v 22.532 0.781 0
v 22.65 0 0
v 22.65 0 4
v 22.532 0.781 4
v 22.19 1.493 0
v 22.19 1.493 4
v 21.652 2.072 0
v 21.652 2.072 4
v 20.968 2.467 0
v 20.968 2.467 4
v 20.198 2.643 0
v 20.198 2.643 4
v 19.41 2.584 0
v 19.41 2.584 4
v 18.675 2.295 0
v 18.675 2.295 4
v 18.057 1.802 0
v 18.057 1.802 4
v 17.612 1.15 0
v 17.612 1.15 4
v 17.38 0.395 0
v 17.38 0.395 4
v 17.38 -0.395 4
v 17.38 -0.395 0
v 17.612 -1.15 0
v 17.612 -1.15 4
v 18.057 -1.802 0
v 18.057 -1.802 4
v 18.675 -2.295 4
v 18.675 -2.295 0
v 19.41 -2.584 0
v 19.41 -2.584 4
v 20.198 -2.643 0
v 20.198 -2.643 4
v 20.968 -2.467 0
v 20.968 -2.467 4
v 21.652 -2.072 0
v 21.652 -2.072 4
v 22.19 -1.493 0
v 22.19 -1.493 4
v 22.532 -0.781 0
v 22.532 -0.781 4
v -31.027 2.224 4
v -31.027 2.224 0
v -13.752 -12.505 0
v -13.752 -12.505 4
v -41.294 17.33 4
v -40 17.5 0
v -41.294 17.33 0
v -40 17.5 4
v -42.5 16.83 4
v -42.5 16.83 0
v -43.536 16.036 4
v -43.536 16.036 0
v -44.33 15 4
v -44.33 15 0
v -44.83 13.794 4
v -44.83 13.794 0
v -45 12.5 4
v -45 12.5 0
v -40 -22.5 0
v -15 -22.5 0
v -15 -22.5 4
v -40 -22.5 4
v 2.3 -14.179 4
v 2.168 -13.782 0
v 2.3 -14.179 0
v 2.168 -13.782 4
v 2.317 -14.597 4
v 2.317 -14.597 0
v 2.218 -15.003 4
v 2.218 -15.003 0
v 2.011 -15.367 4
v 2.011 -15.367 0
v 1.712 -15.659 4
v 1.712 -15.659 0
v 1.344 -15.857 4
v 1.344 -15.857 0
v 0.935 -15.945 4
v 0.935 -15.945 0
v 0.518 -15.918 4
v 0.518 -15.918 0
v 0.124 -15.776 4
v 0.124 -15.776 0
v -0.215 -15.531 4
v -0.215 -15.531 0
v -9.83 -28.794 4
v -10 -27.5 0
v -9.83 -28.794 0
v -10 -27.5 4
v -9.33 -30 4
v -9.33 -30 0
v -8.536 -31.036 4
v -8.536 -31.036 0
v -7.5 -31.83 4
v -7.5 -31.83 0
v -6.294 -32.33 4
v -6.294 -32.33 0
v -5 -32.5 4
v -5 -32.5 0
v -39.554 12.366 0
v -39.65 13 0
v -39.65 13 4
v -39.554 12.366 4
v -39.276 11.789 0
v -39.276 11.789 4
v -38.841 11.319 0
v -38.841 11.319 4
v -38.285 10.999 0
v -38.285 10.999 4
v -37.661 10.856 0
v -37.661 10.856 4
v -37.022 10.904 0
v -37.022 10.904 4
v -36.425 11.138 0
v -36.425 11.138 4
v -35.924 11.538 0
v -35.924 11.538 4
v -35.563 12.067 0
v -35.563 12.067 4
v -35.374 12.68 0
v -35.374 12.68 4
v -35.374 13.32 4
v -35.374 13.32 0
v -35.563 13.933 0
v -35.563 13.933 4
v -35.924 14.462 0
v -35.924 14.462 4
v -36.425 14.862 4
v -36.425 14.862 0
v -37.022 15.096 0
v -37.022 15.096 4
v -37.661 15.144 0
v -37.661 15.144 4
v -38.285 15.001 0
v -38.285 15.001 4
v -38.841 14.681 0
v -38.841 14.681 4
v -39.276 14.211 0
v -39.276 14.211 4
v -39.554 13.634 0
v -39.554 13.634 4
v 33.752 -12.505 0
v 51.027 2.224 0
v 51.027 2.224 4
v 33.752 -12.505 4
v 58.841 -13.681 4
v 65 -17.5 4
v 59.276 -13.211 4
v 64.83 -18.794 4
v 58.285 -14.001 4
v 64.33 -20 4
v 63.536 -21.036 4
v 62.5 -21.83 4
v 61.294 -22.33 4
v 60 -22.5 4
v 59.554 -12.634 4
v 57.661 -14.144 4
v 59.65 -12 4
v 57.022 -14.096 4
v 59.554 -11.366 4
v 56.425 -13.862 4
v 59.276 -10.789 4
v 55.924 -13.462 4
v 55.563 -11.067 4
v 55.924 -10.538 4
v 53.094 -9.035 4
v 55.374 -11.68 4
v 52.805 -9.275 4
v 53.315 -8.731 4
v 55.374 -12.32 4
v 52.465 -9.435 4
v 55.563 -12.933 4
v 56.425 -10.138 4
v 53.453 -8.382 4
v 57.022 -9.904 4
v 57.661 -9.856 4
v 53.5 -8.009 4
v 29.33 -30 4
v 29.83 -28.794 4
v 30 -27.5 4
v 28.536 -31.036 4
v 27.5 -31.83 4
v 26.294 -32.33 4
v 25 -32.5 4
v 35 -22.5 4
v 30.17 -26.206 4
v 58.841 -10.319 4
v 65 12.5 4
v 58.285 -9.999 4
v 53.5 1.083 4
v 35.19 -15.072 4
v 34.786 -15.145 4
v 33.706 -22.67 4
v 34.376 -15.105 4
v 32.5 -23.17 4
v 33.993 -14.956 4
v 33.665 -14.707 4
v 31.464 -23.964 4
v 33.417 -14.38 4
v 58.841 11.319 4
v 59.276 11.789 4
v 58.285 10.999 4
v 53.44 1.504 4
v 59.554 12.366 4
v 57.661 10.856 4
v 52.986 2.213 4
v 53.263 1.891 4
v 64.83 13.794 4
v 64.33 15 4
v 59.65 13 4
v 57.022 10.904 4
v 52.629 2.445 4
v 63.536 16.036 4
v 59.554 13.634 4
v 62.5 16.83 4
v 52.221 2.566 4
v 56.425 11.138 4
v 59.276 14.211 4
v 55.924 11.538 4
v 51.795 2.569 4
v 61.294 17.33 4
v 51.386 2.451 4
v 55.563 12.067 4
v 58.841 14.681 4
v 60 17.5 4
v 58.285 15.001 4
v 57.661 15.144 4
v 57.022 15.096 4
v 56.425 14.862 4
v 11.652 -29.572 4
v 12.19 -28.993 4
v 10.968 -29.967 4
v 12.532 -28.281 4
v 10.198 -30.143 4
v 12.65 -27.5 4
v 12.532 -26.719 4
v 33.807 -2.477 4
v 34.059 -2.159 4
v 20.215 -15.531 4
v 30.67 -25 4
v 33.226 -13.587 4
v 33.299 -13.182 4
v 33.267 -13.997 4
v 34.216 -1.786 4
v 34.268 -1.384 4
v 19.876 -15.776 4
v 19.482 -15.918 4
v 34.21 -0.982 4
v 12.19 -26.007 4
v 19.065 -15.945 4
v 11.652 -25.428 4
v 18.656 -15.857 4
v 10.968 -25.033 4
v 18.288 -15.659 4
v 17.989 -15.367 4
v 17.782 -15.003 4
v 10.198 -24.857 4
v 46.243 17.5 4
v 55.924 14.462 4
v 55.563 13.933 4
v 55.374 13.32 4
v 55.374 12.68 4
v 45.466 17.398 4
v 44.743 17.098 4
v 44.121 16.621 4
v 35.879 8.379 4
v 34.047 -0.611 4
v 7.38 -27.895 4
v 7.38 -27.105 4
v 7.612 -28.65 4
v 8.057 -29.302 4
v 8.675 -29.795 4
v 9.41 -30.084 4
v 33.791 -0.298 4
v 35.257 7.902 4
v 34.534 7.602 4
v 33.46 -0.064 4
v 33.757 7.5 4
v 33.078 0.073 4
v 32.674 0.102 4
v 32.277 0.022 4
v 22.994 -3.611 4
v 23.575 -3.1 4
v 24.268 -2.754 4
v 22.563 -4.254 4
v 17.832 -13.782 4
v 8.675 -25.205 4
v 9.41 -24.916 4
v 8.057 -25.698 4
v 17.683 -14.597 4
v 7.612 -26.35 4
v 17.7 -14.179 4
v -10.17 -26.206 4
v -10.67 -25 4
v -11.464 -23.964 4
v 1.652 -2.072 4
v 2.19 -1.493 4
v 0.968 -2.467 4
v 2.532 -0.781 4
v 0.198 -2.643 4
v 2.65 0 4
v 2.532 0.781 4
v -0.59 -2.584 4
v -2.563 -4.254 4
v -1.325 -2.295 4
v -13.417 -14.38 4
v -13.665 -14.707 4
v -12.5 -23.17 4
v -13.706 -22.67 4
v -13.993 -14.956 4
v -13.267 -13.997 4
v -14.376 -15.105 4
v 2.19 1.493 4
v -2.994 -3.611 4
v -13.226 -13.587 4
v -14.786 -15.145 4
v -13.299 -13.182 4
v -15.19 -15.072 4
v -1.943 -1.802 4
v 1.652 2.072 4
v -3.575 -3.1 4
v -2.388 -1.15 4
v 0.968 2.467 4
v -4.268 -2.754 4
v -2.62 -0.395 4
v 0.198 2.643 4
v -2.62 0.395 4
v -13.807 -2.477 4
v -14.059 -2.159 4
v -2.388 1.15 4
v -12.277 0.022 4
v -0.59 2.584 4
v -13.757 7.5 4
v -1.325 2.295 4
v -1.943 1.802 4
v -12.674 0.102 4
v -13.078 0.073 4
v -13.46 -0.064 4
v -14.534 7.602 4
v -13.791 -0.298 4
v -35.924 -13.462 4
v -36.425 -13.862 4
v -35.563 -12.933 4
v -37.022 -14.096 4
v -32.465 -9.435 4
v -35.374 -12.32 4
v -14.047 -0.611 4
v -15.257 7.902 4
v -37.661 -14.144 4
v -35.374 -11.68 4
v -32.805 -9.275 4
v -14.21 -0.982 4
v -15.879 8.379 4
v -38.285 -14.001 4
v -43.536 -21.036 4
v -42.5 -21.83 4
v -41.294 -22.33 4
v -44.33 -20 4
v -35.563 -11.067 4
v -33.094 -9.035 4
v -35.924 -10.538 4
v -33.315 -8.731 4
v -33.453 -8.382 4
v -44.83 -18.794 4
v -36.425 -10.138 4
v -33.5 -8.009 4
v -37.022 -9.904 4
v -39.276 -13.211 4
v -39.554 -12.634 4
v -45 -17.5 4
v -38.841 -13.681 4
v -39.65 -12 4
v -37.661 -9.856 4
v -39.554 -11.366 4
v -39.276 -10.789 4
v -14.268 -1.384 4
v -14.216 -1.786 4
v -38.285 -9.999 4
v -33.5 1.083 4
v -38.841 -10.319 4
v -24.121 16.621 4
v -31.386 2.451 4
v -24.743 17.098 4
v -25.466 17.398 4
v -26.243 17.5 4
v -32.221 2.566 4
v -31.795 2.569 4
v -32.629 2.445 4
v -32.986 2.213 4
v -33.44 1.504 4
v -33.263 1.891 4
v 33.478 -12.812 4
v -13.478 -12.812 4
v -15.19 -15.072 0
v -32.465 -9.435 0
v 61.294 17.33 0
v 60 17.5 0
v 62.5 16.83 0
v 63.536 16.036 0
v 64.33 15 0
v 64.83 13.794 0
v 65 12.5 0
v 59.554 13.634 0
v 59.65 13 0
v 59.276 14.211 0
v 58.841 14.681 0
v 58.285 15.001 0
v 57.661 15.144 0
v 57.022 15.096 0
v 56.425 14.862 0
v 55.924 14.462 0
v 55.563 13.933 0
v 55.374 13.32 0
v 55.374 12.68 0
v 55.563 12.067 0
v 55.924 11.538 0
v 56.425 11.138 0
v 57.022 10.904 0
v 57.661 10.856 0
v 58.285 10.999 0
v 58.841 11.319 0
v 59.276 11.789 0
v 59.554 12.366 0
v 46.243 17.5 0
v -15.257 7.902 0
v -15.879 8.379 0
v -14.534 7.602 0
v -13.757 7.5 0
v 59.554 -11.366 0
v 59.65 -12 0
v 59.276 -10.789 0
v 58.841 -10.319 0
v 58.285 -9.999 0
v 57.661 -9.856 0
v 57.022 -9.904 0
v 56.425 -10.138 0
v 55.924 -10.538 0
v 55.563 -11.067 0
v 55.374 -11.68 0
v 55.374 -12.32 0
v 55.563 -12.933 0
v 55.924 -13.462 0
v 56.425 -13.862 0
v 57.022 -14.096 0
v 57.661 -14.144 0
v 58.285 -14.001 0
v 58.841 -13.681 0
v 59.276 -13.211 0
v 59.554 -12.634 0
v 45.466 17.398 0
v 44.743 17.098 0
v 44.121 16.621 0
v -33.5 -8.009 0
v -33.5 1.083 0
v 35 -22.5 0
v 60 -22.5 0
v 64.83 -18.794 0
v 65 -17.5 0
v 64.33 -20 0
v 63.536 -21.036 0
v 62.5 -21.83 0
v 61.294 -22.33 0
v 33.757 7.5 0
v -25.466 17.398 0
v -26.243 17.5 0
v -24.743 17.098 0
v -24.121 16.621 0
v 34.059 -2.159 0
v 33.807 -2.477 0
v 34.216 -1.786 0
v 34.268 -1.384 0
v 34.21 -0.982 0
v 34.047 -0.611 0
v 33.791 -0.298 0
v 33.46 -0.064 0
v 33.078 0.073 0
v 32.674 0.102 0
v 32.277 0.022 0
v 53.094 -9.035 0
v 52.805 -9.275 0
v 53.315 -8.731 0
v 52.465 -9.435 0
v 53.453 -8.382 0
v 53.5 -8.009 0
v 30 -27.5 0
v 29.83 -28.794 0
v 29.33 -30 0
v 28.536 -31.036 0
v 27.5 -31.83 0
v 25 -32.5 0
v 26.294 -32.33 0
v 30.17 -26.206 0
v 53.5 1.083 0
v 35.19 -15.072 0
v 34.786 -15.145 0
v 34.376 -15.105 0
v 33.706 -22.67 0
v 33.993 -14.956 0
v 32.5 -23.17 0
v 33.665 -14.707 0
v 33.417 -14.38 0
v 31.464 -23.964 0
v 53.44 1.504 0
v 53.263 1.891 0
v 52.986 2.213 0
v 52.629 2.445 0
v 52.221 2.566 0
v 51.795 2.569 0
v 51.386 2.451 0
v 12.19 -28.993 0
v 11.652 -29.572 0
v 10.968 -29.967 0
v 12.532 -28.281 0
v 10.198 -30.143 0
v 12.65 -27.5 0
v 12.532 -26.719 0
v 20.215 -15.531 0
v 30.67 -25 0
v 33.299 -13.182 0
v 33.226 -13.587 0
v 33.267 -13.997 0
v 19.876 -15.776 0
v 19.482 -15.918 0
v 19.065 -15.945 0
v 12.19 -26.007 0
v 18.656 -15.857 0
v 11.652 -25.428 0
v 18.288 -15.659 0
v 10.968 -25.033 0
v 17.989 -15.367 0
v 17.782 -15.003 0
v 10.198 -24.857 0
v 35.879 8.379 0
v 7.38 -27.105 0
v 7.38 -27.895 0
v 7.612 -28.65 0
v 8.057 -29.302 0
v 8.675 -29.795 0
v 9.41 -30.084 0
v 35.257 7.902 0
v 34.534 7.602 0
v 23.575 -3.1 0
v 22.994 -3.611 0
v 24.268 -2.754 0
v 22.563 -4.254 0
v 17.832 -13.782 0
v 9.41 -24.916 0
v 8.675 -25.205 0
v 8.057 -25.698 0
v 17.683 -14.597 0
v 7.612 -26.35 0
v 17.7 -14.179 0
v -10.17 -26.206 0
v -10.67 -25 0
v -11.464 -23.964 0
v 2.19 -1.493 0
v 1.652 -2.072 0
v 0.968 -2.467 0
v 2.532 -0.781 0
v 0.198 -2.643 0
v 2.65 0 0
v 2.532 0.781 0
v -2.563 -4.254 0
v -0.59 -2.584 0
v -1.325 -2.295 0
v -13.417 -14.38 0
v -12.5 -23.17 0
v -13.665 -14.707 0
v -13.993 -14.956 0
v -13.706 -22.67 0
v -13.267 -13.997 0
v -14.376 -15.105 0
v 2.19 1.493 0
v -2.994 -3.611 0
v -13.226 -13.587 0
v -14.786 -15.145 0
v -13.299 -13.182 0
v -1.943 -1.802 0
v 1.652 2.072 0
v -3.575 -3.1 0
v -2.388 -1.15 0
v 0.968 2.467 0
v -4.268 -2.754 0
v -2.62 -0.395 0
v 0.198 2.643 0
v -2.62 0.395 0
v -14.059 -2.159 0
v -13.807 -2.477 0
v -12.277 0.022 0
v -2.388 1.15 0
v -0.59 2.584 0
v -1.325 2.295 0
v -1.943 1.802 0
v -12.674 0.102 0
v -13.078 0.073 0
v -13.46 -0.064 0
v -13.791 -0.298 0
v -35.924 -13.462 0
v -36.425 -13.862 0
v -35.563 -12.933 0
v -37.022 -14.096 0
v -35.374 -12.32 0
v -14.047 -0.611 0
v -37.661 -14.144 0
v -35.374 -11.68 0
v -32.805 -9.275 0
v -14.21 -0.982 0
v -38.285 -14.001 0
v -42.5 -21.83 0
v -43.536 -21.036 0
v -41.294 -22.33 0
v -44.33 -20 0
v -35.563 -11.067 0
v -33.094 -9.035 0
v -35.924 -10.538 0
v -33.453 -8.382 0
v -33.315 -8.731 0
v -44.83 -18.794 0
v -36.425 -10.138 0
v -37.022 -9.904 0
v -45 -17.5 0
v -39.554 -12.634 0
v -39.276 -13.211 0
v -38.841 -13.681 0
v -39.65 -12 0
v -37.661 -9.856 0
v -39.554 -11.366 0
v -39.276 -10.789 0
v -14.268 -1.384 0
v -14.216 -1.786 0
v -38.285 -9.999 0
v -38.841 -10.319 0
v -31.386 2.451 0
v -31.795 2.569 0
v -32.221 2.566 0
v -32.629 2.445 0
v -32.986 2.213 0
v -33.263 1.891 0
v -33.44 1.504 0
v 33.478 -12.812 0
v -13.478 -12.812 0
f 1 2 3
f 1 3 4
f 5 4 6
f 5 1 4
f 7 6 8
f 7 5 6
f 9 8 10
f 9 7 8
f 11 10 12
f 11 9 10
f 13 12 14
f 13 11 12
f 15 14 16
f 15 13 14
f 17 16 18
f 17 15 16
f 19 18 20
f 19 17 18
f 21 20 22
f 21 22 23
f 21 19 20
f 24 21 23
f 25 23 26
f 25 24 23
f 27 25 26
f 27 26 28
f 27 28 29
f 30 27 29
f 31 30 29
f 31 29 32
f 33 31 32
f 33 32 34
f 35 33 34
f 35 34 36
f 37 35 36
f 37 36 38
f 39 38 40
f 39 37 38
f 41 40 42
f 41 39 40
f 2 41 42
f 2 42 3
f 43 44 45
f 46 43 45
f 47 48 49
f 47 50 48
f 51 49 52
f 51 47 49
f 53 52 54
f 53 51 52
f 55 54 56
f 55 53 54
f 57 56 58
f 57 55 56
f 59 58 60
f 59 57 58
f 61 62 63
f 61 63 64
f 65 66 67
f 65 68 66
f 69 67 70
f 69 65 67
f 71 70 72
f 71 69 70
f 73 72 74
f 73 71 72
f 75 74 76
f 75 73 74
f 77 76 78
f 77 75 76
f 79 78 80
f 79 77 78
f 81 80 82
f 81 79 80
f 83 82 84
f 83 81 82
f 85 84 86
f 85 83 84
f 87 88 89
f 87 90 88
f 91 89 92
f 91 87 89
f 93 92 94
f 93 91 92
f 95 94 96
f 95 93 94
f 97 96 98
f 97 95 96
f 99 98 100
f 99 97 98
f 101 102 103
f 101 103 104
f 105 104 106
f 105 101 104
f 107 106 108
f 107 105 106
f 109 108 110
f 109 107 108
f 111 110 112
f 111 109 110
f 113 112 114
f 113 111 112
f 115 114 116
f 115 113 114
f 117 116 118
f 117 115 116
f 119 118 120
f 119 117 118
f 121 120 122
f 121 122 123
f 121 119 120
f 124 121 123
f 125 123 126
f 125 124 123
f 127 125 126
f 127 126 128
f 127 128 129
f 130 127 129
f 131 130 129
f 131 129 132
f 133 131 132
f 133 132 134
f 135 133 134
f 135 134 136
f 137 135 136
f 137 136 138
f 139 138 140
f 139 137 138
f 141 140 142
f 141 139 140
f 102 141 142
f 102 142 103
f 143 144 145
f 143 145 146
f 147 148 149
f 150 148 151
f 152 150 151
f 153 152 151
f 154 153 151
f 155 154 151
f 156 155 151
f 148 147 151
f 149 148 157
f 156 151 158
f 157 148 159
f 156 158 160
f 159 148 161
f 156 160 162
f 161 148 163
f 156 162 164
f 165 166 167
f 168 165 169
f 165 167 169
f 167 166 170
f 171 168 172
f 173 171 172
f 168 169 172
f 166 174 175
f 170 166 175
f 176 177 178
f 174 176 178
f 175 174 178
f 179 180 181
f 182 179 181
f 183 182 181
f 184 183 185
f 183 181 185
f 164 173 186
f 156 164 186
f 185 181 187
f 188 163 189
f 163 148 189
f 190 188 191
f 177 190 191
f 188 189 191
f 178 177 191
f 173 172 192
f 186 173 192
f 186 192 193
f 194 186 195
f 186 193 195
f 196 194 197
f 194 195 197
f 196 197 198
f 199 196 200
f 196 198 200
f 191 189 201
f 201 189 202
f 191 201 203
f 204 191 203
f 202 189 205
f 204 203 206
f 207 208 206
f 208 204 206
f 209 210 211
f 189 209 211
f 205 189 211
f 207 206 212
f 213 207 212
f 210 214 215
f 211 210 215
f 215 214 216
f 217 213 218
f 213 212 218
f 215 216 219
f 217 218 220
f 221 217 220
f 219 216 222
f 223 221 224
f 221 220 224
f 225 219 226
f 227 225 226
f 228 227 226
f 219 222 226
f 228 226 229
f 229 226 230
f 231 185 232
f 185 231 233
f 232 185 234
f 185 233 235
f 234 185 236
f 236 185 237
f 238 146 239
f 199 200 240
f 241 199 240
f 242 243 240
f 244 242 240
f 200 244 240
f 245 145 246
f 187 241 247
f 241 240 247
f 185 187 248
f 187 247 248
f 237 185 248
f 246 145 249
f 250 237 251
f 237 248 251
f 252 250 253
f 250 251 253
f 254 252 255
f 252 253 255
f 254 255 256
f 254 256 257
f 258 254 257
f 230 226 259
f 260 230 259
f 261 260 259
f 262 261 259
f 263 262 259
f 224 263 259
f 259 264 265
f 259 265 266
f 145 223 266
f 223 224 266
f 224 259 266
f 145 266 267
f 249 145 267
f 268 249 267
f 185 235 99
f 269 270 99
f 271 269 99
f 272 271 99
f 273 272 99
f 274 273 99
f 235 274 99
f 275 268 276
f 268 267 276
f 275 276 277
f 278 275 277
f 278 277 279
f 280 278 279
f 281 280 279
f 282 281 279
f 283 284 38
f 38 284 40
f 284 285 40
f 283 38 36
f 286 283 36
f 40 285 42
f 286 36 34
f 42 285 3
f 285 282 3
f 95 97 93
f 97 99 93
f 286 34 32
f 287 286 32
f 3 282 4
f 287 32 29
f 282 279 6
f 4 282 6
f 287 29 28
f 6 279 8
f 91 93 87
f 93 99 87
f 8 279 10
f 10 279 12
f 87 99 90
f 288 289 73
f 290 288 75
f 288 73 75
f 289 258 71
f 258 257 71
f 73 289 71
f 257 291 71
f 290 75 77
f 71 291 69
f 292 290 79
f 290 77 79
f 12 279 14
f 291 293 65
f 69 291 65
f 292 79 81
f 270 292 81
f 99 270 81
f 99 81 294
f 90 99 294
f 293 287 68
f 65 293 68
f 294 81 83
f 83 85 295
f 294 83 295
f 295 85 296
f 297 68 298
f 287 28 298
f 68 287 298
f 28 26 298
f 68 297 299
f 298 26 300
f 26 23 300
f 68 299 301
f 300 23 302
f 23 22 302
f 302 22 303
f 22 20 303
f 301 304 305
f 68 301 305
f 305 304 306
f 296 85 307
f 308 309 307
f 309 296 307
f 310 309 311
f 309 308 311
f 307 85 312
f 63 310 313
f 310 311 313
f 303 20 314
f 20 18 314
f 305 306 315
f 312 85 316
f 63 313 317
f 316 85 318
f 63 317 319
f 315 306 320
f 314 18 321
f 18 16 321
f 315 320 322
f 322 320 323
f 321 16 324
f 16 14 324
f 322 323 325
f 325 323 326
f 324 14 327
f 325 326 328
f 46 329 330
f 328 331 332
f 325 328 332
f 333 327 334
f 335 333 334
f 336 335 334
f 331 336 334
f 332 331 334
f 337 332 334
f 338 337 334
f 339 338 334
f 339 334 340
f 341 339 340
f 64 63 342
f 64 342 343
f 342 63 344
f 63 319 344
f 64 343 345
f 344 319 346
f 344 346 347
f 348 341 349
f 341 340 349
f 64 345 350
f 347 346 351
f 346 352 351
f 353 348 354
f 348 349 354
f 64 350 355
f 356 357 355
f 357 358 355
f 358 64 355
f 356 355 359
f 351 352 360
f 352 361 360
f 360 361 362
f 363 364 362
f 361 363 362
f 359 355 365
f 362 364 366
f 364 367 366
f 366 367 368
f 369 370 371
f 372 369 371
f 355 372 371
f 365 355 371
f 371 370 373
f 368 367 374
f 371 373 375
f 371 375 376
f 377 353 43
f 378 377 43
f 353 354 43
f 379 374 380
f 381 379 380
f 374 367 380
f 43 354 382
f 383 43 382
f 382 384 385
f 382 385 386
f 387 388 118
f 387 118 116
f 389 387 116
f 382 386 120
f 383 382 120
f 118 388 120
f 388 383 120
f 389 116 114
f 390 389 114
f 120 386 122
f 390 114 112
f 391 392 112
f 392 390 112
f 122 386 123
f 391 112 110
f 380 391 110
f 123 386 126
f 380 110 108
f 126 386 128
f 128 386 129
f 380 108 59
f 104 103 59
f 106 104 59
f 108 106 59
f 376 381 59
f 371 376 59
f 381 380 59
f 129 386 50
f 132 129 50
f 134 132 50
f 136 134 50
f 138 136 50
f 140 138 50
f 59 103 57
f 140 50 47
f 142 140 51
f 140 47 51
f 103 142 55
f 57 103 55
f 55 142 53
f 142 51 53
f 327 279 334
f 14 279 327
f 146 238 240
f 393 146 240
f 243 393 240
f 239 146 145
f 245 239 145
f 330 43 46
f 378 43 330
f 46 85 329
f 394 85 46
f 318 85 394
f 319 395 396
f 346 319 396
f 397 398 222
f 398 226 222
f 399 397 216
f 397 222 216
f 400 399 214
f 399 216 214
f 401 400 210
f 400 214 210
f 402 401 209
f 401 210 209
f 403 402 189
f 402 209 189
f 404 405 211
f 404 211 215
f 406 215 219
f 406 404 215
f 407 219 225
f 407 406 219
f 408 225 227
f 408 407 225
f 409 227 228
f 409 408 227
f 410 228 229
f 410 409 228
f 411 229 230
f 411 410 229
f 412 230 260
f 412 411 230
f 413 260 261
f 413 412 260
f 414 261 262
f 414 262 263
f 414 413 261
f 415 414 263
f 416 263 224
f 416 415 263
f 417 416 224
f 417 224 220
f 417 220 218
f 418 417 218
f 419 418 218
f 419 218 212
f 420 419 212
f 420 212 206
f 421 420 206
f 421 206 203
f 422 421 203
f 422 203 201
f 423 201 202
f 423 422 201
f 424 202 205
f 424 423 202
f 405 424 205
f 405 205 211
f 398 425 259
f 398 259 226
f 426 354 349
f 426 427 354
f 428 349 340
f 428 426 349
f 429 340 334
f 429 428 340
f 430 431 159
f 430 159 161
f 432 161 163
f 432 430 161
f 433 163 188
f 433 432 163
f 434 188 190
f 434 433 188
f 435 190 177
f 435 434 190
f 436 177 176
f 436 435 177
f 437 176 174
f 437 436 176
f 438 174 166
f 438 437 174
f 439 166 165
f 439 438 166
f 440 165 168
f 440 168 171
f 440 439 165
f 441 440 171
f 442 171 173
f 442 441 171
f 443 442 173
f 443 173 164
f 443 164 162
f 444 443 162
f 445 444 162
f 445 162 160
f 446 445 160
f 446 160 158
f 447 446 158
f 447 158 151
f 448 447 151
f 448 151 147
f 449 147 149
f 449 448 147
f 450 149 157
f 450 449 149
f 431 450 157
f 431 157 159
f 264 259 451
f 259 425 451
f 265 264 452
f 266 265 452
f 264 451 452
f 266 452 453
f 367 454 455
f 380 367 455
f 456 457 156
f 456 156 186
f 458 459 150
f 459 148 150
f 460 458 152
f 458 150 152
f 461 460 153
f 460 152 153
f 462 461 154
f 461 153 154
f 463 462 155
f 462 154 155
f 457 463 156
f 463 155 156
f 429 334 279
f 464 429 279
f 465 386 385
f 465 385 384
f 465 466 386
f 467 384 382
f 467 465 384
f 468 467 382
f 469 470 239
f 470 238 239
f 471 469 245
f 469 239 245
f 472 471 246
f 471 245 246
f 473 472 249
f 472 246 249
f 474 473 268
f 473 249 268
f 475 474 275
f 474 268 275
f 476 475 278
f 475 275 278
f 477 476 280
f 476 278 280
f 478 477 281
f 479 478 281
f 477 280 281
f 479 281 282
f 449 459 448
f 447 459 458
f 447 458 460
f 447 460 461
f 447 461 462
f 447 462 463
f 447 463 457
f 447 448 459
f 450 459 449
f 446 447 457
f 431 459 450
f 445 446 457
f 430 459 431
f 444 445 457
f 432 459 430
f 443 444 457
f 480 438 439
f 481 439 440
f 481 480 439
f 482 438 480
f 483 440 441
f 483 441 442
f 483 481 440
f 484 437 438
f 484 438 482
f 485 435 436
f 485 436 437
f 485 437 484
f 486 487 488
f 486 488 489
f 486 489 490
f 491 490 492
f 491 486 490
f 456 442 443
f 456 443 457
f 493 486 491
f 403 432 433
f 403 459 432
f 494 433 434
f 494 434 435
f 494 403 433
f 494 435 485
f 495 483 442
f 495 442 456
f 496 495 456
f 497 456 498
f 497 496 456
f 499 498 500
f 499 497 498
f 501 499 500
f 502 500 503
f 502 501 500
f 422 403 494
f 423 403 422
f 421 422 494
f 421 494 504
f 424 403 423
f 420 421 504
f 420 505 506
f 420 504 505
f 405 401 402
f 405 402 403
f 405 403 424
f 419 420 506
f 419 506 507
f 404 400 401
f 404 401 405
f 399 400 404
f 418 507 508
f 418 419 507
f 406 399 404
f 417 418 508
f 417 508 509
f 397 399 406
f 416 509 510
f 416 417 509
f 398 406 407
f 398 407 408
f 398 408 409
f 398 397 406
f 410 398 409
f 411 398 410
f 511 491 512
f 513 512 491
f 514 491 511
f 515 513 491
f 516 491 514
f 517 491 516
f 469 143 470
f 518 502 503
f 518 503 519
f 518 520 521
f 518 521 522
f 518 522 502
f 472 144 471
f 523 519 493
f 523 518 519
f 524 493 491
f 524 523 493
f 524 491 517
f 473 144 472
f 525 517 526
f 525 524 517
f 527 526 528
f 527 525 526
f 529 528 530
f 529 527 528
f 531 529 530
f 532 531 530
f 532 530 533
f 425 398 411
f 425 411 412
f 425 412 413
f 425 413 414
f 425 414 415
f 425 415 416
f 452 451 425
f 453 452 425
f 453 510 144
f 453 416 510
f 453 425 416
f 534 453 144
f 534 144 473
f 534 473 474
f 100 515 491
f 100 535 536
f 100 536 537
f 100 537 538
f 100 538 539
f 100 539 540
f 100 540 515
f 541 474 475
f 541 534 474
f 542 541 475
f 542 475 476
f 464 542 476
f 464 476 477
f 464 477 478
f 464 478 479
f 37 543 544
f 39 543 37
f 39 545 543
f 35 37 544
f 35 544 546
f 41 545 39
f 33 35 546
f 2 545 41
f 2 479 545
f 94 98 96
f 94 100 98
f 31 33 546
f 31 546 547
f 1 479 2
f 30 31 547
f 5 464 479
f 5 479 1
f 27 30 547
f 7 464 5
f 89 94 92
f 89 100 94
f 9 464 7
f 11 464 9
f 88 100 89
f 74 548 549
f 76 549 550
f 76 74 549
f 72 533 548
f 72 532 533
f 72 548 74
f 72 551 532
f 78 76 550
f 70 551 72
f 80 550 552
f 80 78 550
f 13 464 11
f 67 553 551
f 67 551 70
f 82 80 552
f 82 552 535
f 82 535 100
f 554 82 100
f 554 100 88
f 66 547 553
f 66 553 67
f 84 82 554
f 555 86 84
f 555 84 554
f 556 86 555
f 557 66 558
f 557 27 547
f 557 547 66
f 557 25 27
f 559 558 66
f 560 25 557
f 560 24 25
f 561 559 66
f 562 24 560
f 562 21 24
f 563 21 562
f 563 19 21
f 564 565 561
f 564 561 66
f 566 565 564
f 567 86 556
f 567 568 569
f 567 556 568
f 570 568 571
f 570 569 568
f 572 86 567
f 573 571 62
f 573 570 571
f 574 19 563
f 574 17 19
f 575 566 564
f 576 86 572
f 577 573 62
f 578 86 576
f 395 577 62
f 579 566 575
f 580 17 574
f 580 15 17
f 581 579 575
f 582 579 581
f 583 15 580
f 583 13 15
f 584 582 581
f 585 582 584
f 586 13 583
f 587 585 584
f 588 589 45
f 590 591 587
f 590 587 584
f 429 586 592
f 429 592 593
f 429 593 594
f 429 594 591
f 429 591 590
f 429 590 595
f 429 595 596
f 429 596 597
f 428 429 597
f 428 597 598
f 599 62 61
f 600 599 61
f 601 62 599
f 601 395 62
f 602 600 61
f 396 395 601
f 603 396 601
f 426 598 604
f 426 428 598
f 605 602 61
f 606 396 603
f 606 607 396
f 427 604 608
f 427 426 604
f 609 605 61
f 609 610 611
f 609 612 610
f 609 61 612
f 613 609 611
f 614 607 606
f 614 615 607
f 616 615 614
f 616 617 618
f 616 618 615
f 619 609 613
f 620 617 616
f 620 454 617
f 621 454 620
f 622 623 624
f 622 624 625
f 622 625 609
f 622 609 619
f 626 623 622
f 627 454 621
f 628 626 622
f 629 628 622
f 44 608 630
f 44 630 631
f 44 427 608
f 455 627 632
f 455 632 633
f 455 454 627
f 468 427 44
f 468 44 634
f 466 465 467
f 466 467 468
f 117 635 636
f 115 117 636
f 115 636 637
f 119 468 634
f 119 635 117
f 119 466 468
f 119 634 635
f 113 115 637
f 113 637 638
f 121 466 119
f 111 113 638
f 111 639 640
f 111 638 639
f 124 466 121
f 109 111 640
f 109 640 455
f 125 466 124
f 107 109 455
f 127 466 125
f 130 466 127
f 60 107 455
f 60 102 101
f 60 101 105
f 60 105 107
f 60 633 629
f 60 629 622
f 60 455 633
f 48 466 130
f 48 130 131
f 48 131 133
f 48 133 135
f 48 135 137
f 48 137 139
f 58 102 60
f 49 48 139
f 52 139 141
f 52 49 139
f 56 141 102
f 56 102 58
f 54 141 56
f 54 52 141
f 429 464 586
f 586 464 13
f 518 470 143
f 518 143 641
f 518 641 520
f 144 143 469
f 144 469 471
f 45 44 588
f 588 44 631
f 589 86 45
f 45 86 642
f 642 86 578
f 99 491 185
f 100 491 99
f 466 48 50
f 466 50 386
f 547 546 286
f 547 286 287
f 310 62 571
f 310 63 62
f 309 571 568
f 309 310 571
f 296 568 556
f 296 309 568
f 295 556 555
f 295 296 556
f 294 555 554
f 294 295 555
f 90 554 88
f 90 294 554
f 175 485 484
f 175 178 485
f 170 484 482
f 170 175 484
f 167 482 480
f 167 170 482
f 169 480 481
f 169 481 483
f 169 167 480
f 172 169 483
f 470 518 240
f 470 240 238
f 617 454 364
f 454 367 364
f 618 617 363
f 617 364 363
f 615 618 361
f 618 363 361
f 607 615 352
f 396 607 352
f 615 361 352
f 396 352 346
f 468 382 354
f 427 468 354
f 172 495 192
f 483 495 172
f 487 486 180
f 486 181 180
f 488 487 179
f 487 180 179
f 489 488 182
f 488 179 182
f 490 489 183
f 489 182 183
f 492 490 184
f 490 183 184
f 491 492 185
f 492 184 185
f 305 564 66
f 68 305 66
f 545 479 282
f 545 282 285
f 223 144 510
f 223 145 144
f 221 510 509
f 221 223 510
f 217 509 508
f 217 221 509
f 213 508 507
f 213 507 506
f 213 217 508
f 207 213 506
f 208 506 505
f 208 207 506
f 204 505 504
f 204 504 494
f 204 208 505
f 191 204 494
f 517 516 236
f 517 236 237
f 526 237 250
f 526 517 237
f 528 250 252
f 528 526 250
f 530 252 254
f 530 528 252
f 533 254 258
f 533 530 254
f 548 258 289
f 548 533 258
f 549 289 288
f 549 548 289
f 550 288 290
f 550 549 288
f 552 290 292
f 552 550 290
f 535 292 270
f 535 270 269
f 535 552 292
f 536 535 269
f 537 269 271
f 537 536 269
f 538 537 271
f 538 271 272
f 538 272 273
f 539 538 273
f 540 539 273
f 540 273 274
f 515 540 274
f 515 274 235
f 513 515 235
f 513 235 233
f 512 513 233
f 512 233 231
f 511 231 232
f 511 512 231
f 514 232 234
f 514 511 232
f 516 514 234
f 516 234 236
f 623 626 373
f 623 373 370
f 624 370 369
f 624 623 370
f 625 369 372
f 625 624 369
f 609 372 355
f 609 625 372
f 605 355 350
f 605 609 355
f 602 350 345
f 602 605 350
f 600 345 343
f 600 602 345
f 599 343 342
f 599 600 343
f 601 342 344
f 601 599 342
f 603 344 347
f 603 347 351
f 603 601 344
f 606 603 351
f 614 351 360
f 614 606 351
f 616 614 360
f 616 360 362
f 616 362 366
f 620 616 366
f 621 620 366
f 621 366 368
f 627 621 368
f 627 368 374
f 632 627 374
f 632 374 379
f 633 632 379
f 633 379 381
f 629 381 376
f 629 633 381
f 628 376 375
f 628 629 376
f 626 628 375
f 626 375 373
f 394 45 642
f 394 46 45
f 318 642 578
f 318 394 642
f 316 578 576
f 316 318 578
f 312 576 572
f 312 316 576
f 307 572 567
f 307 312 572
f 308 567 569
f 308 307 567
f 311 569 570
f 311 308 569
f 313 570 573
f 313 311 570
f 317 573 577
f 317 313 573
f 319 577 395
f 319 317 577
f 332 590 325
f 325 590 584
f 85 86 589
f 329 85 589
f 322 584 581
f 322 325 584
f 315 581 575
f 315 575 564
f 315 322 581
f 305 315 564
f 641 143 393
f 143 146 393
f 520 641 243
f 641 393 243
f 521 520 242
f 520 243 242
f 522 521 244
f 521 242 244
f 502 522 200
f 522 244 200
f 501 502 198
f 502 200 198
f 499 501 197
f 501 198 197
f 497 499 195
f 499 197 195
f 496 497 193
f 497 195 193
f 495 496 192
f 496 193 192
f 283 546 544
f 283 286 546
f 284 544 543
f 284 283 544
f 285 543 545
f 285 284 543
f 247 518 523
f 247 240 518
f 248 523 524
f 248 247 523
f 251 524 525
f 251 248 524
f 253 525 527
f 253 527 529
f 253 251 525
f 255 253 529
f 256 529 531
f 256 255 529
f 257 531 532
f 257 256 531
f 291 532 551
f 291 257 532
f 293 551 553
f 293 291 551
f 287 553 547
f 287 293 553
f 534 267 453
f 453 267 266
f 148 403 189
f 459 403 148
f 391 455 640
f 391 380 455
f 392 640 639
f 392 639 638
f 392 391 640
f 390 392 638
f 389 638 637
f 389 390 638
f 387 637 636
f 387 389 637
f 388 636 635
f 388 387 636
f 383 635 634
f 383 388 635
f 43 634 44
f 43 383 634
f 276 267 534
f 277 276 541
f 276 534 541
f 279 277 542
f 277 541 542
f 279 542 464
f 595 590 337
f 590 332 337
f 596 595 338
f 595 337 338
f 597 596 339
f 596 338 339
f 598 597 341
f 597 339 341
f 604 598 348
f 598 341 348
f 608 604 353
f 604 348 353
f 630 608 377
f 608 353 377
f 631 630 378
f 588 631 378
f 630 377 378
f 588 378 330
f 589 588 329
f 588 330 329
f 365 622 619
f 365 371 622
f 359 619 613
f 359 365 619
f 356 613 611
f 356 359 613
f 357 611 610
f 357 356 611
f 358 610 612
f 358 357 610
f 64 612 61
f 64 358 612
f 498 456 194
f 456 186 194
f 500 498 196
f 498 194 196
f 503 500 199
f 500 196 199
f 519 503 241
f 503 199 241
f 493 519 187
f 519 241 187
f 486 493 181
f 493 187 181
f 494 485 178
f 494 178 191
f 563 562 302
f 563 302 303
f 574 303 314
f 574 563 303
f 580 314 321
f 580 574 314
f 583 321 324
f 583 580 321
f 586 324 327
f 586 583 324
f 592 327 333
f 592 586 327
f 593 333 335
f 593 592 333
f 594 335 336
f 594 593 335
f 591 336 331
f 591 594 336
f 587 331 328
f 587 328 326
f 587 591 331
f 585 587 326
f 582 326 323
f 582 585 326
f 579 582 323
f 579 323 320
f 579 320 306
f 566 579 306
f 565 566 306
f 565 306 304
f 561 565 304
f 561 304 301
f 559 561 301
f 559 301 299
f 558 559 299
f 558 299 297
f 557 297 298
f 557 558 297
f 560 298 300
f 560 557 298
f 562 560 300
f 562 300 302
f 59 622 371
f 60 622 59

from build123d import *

# Parameters (mm, degrees)
SKETCH_1_R               = 2.65
SKETCH_1_R_2             = 2.15
EXTRUDE_1_DEPTH          = 4
FILLET_1_R               = 5
CUT_EXTRUDE_1_DEPTH      = 73.782209365
FILLET_2_R               = 3
CUT_EXTRUDE_2_DEPTH      = 73.782209365
CUT_EXTRUDE_2_DEPTH_BACK = 73.782209365
FILLET_4_R               = 1.5
FILLET_6_R               = 3


with BuildPart() as part:
    # 草图1 → 凸台-拉伸1 (new body)
    with BuildSketch(Plane.XY):
        Polygon((-45, 17.5), (65, 17.5), (65, -22.5), (30, -22.5), (30, -32.5), (-10, -32.5), (-10, -22.5), (-45, -22.5), align=None)
        with Locations((20, 0)):
            Circle(SKETCH_1_R, mode=Mode.SUBTRACT)
        Circle(SKETCH_1_R, mode=Mode.SUBTRACT)
        with Locations((57.5, 13)):
            Circle(SKETCH_1_R_2, mode=Mode.SUBTRACT)
        with Locations((57.5, -12)):
            Circle(SKETCH_1_R_2, mode=Mode.SUBTRACT)
        with Locations(Location((-37.5, -12, 0), (0, 0, 180))):
            Circle(SKETCH_1_R_2, mode=Mode.SUBTRACT)
        with Locations(Location((-37.5, 13, 0), (0, 0, 180))):
            Circle(SKETCH_1_R_2, mode=Mode.SUBTRACT)
        with Locations((10, -27.5)):
            Circle(SKETCH_1_R, mode=Mode.SUBTRACT)
    extrude(amount=EXTRUDE_1_DEPTH)

    # 圆角1
    fillet_1_edges = [part.edges().sort_by_distance(p)[0] for p in [
        (30, -22.5, 2),
        (-45, 17.5, 2),
        (-45, -22.5, 2),
        (65, 17.5, 2),
        (65, -22.5, 2),
        (30, -32.5, 2),
        (-10, -32.5, 2),
        (-10, -22.5, 2),
    ]]
    fillet(fillet_1_edges, radius=FILLET_1_R - 0.0001)  # a hair under: the kernel refuses the full size

    # 草图3 → 切除-拉伸1 (cut, through all)
    with BuildSketch(Plane.XY.offset(4)):
        Polygon((-25, 17.5), (-15, 7.5), (35, 7.5), (45, 17.5), align=None)
    extrude(amount=-CUT_EXTRUDE_1_DEPTH, mode=Mode.SUBTRACT)

    # 圆角2
    fillet_2_edges = [part.edges().sort_by_distance(p)[0] for p in [
        (-25, 17.5, 2),
        (45, 17.5, 2),
        (35, 7.5, 2),
        (-15, 7.5, 2),
    ]]
    fillet(fillet_2_edges, radius=FILLET_2_R)

    # 草图4 → 切除-拉伸2 (cut, two sides: drawn at the far end of the back side and taken through both)
    with BuildSketch(Plane.XY.offset(4).offset(-CUT_EXTRUDE_2_DEPTH_BACK)):
        Polygon((38.743514733, 2.264213721), (23.108666515, -3.155866994), (14, -21.5), align=None)
        Polygon((27.981910241, -17.424640848), (53.5, -9.097685243), (53.5, 4.332888314), align=None)
        Polygon((-33.5, -9.097685243), (-33.5, 4.332888314), (-7.981910241, -17.424640848), align=None)
        Polygon((-18.743514733, 2.264213721), (-3.108666515, -3.155866994), (6, -21.5), align=None)
    extrude(amount=CUT_EXTRUDE_2_DEPTH + CUT_EXTRUDE_2_DEPTH_BACK, mode=Mode.SUBTRACT)

    # 圆角4
    fillet_4_edges = [part.edges().sort_by_distance(p)[0] for p in [
        (53.5, 4.332888314, 2),
        (53.5, -9.097685243, 2),
        (27.981910241, -17.424640848, 2),
        (-7.981910241, -17.424640848, 2),
        (-33.5, -9.097685243, 2),
        (-33.5, 4.332888314, 2),
        (38.743514733, 2.264213721, 2),
        (14, -21.5, 2),
        (-18.743514733, 2.264213721, 2),
        (6, -21.5, 2),
    ]]
    fillet(fillet_4_edges, radius=FILLET_4_R)

    # 圆角6
    fillet_6_edges = [part.edges().sort_by_distance(p)[0] for p in [
        (-3.108666515, -3.155866994, 2),
        (23.108666515, -3.155866994, 2),
    ]]
    fillet(fillet_6_edges, radius=FILLET_6_R)


solid = part.part
